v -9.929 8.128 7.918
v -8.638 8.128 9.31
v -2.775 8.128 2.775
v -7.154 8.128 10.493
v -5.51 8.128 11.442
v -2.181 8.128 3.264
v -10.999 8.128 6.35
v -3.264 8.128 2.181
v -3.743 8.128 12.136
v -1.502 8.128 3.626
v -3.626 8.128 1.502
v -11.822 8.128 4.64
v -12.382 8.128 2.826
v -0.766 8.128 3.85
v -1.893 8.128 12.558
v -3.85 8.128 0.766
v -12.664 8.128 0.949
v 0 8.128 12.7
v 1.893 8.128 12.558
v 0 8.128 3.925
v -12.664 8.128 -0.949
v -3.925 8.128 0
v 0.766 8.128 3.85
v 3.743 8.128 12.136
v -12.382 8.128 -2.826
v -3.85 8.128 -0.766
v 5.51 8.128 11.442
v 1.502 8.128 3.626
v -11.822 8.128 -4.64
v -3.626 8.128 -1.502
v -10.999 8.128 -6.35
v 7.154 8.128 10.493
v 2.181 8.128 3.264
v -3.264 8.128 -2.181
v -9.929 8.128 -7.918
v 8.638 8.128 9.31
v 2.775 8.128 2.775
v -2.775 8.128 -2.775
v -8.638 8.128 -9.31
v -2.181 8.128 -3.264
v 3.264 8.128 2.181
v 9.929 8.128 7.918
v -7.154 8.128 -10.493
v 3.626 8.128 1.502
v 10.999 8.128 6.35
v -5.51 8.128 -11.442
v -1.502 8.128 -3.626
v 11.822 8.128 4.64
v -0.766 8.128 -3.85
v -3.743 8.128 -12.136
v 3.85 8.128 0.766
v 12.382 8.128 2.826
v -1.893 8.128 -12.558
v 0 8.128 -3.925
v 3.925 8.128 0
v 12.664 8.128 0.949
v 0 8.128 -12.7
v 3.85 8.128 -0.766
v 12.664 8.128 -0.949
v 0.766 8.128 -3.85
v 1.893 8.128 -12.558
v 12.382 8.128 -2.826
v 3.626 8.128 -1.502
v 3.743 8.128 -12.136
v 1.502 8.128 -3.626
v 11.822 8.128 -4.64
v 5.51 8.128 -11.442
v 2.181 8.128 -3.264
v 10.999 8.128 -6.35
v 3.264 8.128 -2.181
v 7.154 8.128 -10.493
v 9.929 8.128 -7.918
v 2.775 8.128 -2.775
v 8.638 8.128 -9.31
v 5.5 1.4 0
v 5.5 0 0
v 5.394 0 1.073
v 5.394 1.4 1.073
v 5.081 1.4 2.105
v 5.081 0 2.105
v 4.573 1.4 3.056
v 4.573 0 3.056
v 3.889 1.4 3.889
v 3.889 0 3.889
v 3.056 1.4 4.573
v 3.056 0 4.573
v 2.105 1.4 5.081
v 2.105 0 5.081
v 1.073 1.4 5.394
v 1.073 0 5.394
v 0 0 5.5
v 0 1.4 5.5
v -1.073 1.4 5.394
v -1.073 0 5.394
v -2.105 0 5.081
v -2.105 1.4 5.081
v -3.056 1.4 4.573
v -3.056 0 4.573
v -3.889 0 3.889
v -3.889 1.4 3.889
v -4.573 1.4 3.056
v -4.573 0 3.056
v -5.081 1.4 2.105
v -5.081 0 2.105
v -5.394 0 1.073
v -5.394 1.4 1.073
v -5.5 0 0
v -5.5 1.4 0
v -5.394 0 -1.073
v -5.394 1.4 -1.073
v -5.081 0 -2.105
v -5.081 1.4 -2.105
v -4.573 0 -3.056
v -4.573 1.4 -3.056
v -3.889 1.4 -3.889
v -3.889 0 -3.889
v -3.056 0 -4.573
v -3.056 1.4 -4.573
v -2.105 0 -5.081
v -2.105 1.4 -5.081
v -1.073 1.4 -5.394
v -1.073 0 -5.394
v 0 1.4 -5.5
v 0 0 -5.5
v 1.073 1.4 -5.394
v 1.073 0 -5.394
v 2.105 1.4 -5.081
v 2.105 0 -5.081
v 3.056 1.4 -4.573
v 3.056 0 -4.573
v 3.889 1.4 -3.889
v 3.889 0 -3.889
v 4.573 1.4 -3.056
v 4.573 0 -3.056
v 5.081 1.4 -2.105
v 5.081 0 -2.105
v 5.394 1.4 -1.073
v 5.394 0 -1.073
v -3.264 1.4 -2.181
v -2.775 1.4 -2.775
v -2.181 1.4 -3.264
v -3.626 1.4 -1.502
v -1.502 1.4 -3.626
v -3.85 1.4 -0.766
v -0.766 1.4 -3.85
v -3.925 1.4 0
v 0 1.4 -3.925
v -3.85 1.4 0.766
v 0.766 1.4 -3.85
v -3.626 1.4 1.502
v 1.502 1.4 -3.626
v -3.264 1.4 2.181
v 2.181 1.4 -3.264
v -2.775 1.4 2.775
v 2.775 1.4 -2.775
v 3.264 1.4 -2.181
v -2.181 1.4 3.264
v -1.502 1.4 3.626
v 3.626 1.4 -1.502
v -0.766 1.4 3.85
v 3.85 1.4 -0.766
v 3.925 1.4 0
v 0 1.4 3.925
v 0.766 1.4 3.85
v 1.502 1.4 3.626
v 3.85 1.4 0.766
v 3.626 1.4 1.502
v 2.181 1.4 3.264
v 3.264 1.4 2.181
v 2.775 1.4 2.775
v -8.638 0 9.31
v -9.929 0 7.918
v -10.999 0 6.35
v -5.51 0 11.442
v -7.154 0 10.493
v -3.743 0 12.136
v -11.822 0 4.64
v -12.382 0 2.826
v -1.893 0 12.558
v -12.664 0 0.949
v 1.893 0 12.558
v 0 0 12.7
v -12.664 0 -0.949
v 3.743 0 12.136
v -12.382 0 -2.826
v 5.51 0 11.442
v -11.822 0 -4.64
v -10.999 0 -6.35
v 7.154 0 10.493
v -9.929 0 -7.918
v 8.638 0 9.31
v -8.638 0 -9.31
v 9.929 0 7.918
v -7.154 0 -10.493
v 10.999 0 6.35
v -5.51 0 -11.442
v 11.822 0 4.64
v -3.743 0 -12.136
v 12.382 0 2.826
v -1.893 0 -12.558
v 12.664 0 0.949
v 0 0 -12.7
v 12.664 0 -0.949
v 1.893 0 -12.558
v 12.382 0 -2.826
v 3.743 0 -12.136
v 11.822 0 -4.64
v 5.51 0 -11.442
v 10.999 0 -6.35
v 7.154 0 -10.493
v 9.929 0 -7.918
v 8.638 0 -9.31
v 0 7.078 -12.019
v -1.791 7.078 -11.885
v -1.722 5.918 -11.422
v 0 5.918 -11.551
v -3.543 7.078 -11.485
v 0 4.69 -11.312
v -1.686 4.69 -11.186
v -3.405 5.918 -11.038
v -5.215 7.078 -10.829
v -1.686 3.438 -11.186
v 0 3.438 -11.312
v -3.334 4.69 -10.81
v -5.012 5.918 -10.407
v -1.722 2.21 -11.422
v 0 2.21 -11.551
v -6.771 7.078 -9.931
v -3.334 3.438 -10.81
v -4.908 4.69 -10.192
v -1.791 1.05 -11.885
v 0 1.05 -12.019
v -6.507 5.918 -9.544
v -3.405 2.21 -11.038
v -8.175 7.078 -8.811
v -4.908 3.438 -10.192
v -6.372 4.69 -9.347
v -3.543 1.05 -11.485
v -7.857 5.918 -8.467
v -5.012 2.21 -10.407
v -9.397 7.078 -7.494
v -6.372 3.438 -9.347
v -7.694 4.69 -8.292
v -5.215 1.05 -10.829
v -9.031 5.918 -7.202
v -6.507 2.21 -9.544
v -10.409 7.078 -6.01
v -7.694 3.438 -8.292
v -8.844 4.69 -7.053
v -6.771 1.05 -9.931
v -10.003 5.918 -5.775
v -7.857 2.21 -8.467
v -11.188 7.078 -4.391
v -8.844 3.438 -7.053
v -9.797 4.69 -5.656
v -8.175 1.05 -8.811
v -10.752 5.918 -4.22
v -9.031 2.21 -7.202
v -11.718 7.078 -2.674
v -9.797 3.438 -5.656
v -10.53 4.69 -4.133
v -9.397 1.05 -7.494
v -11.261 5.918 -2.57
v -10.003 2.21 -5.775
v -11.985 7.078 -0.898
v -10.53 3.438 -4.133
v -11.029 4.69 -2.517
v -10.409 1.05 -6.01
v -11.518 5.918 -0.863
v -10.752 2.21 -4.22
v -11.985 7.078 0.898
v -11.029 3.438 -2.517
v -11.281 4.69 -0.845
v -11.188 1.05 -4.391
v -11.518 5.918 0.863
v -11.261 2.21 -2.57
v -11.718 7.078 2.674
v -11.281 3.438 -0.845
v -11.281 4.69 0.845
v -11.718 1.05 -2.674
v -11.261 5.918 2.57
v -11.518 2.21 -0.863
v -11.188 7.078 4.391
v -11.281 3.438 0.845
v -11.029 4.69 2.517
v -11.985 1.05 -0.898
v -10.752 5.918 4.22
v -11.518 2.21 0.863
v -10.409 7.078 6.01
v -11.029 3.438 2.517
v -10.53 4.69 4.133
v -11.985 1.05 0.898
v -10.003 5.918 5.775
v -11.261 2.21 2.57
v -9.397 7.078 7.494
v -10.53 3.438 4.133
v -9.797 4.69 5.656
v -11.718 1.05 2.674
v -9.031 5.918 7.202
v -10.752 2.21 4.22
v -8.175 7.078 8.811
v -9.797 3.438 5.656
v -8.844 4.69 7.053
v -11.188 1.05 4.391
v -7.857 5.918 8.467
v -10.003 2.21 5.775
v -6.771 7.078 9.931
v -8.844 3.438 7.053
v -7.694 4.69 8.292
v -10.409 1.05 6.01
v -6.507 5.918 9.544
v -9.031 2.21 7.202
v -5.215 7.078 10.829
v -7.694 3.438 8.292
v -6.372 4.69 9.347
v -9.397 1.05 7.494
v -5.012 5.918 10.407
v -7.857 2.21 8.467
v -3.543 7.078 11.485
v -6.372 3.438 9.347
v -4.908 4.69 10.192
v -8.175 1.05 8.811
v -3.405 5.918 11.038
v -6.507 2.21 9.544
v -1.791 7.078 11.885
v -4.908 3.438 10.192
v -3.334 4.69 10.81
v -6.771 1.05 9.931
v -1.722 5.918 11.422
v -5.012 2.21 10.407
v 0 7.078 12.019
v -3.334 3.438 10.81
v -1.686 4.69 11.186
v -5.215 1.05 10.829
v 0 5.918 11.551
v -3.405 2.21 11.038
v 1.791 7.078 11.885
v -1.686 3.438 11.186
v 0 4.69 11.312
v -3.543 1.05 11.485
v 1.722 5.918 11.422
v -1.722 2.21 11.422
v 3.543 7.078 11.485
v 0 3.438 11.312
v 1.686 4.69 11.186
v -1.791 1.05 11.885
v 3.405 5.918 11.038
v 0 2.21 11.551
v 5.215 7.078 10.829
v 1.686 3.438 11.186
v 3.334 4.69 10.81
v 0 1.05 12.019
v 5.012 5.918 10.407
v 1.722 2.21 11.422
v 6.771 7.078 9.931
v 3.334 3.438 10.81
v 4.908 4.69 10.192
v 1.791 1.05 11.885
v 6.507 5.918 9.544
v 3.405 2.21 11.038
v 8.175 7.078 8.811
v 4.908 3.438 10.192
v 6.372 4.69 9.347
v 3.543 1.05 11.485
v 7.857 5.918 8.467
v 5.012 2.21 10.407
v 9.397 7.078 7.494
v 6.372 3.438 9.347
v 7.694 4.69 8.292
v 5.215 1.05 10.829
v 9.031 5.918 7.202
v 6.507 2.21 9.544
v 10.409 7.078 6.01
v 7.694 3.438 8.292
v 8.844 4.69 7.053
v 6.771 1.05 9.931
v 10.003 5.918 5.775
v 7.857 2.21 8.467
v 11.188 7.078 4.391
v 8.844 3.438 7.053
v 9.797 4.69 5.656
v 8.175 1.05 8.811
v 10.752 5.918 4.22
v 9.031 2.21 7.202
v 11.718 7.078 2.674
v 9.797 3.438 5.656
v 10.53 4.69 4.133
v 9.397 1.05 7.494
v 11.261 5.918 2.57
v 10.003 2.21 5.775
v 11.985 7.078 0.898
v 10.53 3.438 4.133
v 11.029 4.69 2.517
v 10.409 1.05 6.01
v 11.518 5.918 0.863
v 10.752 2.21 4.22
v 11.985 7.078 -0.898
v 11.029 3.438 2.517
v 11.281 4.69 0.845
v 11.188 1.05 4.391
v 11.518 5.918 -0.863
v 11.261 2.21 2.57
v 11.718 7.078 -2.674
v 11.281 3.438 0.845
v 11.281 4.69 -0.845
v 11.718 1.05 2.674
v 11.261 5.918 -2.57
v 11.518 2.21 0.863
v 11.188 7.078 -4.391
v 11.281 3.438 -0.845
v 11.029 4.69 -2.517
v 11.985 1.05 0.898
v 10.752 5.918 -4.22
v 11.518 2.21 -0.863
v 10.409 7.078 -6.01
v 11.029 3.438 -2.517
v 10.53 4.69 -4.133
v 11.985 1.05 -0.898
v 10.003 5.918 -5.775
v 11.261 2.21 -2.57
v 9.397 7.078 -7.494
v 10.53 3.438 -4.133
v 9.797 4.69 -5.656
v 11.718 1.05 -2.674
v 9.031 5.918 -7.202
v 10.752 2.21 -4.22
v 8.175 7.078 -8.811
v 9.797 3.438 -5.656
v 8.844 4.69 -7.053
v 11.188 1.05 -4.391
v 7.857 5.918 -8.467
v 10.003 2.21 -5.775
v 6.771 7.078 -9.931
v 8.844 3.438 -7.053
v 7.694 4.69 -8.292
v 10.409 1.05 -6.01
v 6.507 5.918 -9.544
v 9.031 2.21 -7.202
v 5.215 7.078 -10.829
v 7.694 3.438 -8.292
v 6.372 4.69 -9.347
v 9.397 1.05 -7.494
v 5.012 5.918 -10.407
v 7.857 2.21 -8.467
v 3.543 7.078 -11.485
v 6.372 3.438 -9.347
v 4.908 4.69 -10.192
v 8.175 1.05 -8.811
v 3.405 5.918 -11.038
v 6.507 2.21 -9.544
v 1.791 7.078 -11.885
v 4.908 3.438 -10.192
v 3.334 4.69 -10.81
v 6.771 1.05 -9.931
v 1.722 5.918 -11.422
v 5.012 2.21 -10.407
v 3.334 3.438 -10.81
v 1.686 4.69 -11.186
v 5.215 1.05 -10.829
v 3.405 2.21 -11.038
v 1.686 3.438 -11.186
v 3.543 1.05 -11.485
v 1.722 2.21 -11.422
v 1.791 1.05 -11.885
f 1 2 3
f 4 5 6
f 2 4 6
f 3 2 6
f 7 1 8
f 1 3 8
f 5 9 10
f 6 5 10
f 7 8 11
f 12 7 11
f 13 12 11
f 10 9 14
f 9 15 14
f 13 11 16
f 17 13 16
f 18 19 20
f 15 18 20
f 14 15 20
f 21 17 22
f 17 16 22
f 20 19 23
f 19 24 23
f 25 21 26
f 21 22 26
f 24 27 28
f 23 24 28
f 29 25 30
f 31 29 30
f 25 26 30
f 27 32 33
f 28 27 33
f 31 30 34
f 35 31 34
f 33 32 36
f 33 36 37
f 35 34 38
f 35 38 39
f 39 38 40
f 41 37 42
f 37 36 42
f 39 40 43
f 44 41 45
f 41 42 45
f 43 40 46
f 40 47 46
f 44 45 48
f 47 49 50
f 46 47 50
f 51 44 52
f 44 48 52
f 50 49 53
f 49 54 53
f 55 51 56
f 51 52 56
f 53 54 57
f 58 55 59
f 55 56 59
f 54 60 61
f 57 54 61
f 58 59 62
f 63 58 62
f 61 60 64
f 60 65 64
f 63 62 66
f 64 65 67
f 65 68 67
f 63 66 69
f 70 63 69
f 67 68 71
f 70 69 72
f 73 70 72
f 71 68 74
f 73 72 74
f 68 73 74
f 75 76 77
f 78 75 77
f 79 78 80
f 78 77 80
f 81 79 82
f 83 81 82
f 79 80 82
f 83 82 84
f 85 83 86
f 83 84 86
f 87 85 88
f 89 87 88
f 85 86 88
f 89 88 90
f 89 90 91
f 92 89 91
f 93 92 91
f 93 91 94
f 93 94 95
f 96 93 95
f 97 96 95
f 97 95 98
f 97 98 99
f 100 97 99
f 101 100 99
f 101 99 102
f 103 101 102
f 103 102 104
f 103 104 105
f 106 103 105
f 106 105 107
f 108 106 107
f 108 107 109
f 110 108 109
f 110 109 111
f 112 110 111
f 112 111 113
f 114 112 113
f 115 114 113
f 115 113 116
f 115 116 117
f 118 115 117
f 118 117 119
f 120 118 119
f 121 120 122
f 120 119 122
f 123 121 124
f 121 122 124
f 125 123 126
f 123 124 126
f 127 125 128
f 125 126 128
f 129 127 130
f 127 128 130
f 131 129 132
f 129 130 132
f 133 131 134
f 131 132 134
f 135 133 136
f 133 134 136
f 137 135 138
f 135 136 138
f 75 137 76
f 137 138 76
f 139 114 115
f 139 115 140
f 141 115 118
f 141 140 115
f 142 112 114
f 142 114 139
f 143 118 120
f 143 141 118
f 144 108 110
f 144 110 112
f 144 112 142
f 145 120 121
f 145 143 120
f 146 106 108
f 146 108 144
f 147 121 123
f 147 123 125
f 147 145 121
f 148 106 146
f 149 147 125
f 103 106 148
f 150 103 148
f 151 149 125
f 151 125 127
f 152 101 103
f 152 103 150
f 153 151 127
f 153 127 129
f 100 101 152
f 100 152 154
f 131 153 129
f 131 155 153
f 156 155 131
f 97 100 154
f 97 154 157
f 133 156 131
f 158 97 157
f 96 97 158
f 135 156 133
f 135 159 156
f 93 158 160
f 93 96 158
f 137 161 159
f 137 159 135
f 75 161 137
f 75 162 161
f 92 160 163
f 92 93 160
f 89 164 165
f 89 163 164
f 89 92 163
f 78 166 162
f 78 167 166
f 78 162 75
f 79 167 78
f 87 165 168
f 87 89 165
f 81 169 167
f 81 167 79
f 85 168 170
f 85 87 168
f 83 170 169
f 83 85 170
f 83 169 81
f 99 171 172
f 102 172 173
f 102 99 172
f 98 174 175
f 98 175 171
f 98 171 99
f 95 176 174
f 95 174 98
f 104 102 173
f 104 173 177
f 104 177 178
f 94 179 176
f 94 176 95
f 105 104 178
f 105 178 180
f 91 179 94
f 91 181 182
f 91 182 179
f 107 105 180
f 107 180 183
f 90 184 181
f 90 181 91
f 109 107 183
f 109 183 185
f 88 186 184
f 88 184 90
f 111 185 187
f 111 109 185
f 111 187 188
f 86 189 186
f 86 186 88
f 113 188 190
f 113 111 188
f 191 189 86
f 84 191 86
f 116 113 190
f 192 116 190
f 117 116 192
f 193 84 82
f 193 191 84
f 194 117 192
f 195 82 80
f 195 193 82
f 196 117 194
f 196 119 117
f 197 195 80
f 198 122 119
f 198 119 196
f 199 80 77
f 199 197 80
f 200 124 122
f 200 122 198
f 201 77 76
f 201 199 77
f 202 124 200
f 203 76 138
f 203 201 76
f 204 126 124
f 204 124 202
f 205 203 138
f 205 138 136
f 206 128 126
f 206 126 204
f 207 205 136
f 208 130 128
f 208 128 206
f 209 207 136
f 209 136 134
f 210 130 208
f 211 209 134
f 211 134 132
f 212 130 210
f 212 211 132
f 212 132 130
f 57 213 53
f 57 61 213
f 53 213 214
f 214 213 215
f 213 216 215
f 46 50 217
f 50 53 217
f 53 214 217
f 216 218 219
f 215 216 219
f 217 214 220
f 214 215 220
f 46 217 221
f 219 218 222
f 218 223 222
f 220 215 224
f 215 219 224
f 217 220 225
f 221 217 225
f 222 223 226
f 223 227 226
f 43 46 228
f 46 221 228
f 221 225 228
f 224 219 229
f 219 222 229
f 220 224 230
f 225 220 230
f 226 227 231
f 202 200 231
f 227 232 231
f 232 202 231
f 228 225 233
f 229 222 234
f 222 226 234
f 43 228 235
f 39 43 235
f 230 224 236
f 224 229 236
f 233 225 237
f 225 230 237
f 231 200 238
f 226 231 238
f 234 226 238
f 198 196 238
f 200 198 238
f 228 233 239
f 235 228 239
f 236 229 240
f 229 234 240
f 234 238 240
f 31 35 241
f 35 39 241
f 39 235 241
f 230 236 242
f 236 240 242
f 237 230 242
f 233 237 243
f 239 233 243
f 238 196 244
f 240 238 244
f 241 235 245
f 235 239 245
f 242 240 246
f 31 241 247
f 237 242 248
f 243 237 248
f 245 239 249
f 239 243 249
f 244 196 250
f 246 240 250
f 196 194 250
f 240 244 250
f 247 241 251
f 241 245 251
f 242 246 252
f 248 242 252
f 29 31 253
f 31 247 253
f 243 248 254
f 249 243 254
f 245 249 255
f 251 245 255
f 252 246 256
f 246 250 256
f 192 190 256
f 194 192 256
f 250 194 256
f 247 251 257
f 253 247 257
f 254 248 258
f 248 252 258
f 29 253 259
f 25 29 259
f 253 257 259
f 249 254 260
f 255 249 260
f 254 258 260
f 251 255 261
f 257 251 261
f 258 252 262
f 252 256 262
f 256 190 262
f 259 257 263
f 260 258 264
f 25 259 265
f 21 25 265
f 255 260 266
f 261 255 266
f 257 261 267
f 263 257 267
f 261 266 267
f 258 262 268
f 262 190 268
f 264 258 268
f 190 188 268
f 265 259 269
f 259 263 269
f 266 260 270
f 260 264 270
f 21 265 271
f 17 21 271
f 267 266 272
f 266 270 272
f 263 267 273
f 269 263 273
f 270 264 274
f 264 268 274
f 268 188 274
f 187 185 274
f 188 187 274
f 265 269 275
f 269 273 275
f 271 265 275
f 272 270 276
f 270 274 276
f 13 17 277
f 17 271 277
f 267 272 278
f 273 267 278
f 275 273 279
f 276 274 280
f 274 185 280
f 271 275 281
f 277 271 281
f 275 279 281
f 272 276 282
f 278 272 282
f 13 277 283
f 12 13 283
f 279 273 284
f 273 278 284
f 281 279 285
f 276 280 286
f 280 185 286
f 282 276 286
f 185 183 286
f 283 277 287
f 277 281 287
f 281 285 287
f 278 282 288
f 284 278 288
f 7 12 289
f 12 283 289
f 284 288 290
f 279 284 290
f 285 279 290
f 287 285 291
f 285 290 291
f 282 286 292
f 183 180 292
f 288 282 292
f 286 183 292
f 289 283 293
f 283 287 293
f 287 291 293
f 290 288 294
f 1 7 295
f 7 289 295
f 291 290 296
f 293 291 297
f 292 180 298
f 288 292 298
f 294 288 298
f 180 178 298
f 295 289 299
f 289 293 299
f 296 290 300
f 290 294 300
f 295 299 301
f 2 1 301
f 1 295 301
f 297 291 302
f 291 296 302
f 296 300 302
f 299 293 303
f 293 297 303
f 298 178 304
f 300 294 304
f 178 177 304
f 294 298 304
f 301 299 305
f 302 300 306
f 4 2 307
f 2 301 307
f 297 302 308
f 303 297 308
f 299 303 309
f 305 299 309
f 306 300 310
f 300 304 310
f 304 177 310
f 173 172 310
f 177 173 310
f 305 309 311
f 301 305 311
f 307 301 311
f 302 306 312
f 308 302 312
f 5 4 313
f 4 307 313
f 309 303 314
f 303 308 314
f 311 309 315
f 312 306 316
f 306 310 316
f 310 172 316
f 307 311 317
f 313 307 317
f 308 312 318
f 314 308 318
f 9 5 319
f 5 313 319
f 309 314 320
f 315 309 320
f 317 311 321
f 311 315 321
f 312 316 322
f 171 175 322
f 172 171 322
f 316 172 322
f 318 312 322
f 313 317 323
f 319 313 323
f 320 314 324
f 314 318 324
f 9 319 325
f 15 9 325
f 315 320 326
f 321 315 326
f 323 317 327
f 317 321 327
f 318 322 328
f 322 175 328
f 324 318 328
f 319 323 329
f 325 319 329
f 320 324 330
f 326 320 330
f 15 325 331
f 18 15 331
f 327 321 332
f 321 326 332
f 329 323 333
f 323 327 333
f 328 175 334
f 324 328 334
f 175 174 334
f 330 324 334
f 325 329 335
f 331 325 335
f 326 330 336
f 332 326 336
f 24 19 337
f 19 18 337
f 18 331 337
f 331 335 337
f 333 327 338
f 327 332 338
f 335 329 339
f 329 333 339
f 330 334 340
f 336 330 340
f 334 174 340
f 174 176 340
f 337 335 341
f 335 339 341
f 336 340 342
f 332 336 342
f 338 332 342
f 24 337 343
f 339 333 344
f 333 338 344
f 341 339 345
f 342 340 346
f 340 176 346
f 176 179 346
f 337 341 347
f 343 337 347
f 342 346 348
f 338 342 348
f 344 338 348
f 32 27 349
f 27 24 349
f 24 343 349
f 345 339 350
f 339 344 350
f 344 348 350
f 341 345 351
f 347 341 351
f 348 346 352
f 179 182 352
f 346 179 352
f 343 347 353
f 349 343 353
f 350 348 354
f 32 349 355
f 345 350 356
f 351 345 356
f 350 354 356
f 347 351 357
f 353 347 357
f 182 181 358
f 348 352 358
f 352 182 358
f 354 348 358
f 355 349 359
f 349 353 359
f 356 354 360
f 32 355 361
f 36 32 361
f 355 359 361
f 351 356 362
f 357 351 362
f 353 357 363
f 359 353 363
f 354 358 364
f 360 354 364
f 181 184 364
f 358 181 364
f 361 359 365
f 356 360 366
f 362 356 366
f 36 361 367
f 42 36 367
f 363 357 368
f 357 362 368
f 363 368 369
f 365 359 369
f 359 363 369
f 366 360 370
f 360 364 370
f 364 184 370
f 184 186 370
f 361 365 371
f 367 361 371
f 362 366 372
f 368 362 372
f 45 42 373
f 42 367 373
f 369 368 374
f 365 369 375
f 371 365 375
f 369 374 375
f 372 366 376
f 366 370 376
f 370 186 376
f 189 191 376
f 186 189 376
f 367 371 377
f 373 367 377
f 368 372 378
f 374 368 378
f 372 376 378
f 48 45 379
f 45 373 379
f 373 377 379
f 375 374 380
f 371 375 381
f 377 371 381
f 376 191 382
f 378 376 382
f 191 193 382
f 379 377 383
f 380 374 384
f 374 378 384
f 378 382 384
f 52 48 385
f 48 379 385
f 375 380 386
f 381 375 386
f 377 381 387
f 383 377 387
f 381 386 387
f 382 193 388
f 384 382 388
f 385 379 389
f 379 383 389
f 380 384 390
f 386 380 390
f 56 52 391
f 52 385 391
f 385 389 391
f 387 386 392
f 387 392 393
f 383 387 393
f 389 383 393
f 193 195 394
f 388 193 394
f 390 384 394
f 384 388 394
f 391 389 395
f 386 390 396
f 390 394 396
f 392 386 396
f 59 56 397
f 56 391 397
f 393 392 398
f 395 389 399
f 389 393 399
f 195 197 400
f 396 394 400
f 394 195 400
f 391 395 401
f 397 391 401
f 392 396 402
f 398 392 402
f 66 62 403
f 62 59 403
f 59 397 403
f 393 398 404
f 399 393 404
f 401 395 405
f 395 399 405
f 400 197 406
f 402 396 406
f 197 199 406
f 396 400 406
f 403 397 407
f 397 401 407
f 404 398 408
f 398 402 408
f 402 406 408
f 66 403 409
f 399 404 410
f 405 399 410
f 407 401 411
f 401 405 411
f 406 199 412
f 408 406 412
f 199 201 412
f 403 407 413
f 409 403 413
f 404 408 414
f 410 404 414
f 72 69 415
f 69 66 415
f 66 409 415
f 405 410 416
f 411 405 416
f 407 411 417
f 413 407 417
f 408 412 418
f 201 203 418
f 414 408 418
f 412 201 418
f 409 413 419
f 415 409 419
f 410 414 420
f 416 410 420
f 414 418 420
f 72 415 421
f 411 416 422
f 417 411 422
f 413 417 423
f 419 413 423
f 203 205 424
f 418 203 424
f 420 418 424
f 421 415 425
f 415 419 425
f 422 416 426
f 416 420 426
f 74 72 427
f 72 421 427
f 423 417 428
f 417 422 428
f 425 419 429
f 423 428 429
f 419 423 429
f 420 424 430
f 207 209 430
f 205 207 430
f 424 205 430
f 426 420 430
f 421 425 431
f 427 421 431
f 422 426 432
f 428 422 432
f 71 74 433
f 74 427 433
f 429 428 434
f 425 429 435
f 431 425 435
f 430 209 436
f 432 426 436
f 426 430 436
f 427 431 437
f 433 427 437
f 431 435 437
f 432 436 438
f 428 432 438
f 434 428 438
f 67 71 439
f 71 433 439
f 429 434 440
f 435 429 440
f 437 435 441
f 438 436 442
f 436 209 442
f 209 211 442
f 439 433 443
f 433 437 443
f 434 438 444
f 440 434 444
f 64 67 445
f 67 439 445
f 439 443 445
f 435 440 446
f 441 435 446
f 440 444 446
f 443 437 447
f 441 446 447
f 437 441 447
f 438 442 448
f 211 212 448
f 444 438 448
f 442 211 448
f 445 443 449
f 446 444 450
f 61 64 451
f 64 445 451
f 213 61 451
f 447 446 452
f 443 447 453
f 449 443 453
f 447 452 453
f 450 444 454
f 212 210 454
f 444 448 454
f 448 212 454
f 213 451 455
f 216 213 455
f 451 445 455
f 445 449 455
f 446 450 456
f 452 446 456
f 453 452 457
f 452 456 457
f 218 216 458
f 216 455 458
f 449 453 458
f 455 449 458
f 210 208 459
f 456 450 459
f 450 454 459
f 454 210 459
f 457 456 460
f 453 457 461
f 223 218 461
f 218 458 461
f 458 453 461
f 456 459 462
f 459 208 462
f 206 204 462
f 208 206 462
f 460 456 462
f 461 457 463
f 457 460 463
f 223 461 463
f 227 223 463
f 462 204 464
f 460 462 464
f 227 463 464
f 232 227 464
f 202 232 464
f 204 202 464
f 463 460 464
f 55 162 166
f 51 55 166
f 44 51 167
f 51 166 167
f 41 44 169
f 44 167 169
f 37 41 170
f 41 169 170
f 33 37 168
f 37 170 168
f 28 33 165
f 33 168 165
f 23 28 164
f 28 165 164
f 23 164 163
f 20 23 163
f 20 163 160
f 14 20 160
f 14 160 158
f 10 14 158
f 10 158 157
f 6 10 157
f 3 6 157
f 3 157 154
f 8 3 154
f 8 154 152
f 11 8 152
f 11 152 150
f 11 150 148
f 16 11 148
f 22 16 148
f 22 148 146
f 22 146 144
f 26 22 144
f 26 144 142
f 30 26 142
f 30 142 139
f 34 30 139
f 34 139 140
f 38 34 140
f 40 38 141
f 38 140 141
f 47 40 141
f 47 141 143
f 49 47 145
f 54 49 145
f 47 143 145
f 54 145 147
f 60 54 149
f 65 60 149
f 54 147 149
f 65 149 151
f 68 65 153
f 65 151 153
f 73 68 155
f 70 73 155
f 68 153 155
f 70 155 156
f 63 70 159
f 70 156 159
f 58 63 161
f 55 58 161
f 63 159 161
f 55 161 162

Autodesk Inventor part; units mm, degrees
ref_plane "YZ Plane" through (0, 0, 0) normal (1, 0, 0) x (0, 1, 0)
ref_plane "XZ Plane" through (0, 0, 0) normal (0, 1, 0) x (-1, 0, 0)
ref_plane "XY Plane" through (0, 0, 0) normal (0, 0, 1) x (1, 0, 0)
sketch "Sketch1" plane through (0, 0, 0) normal (1, 0, 0) x (0, 1, 0)
  line L0 (0, 0) -> (8.128, 0)
  line L1 (8.128, 0) -> (8.128, -12.7)
  line L2 (0, -12.7) -> (0, 0)
  arc A0 (8.128, -12.7) -> (0, -12.7) centre (4.064, -17.8157) ccw
  line L3 (8.128, 0) -> (6.0753, 0)
  line L4 (4.064, 0) -> (4.064, -17.8157) construction
  dimension "d1" = 8.128
  dimension "d2" = 12.7
revolve "Revolution1" add sketch "Sketch1" angle 360 about axis through (0, 8.128, 0) along (0, -1, 0)
sketch "Sketch2" plane through (0, 0, 0) normal (0, -1, 0) x (1, 0, 0)
  circle A0 centre (0, 0) radius 5.5
  dimension "d3" = 11
extrude "Extrusion1" cut sketch "Sketch2" against normal blind 1.4
sketch "Sketch3" plane through (0, 1.4, 0) normal (0, -1, 0) x (1, 0, 0)
  circle A0 centre (0, 0) radius 3.925
  dimension "d6" = 7.85
extrude "Extrusion2" cut sketch "Sketch3" against normal through all
properties part number "top - top pullet"
